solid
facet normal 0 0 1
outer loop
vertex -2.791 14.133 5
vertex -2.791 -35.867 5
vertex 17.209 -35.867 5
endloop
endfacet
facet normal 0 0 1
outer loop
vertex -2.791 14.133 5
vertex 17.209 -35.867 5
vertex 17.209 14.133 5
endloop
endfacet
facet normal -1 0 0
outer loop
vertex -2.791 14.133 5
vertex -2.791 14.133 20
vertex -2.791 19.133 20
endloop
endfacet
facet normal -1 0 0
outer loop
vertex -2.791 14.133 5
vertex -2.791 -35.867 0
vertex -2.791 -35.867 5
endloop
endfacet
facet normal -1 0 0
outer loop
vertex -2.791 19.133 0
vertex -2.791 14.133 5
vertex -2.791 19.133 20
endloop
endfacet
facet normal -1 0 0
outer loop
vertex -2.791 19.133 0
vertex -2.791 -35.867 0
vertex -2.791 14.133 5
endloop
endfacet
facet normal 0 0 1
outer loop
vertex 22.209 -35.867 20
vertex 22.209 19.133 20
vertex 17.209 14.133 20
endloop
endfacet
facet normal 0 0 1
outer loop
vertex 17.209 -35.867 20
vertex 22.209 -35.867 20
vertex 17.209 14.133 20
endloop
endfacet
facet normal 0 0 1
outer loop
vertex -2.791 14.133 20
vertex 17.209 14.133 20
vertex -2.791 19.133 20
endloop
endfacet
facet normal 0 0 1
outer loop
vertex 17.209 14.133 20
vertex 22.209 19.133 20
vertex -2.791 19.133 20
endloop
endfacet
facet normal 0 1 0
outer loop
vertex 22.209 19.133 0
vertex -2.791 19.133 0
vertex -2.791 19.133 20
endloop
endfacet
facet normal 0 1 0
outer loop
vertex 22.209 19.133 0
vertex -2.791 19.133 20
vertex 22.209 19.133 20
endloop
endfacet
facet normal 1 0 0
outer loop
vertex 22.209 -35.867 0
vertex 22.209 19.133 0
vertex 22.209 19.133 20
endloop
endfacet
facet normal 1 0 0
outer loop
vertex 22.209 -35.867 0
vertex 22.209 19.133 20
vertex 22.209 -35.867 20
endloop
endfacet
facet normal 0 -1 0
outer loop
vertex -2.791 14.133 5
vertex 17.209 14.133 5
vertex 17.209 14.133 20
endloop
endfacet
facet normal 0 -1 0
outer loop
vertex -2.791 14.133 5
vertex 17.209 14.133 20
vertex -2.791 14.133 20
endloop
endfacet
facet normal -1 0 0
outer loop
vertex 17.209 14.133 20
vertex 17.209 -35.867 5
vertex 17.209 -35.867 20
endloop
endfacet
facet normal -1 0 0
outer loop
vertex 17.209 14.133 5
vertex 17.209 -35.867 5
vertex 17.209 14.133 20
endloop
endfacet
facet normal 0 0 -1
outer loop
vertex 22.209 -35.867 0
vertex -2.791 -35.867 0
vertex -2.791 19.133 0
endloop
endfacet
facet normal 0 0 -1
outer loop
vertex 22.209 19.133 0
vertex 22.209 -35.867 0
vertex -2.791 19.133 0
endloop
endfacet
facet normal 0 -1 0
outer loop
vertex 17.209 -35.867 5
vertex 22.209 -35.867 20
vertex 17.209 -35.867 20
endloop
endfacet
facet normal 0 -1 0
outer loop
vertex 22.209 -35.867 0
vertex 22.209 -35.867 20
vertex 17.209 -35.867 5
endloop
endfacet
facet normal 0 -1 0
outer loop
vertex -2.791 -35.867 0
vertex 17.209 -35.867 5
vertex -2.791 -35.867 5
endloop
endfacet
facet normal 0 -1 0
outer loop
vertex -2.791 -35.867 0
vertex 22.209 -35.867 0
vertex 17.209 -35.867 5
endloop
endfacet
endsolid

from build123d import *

# Parameters (mm, degrees)
SKETCH1_W           = 55
SKETCH1_H           = 25
BOSS_EXTRUDE1_DEPTH = 5
BOSS_EXTRUDE2_DEPTH = 15


with BuildPart() as part:
    # Sketch1 → Boss-Extrude1 (new body)
    with BuildSketch(Plane(origin=(0, 0, 0), x_dir=(0, 1, 0), z_dir=(0, 0, 1))):
        with Locations((-8.366983373, -9.709026128)):
            Rectangle(SKETCH1_W, SKETCH1_H)
    extrude(amount=BOSS_EXTRUDE1_DEPTH)

    # Sketch3 → Boss-Extrude2 (add)
    with BuildSketch(Plane.XY.offset(5)):
        Polygon((-2.790973872, 14.133016627), (-2.790973872, 19.133016627), (22.209026128, 19.133016627), (22.209026128, -35.866983373), (17.209026128, -35.866983373), (17.209026128, 14.133016627), align=None)
    extrude(amount=BOSS_EXTRUDE2_DEPTH)


solid = part.part
